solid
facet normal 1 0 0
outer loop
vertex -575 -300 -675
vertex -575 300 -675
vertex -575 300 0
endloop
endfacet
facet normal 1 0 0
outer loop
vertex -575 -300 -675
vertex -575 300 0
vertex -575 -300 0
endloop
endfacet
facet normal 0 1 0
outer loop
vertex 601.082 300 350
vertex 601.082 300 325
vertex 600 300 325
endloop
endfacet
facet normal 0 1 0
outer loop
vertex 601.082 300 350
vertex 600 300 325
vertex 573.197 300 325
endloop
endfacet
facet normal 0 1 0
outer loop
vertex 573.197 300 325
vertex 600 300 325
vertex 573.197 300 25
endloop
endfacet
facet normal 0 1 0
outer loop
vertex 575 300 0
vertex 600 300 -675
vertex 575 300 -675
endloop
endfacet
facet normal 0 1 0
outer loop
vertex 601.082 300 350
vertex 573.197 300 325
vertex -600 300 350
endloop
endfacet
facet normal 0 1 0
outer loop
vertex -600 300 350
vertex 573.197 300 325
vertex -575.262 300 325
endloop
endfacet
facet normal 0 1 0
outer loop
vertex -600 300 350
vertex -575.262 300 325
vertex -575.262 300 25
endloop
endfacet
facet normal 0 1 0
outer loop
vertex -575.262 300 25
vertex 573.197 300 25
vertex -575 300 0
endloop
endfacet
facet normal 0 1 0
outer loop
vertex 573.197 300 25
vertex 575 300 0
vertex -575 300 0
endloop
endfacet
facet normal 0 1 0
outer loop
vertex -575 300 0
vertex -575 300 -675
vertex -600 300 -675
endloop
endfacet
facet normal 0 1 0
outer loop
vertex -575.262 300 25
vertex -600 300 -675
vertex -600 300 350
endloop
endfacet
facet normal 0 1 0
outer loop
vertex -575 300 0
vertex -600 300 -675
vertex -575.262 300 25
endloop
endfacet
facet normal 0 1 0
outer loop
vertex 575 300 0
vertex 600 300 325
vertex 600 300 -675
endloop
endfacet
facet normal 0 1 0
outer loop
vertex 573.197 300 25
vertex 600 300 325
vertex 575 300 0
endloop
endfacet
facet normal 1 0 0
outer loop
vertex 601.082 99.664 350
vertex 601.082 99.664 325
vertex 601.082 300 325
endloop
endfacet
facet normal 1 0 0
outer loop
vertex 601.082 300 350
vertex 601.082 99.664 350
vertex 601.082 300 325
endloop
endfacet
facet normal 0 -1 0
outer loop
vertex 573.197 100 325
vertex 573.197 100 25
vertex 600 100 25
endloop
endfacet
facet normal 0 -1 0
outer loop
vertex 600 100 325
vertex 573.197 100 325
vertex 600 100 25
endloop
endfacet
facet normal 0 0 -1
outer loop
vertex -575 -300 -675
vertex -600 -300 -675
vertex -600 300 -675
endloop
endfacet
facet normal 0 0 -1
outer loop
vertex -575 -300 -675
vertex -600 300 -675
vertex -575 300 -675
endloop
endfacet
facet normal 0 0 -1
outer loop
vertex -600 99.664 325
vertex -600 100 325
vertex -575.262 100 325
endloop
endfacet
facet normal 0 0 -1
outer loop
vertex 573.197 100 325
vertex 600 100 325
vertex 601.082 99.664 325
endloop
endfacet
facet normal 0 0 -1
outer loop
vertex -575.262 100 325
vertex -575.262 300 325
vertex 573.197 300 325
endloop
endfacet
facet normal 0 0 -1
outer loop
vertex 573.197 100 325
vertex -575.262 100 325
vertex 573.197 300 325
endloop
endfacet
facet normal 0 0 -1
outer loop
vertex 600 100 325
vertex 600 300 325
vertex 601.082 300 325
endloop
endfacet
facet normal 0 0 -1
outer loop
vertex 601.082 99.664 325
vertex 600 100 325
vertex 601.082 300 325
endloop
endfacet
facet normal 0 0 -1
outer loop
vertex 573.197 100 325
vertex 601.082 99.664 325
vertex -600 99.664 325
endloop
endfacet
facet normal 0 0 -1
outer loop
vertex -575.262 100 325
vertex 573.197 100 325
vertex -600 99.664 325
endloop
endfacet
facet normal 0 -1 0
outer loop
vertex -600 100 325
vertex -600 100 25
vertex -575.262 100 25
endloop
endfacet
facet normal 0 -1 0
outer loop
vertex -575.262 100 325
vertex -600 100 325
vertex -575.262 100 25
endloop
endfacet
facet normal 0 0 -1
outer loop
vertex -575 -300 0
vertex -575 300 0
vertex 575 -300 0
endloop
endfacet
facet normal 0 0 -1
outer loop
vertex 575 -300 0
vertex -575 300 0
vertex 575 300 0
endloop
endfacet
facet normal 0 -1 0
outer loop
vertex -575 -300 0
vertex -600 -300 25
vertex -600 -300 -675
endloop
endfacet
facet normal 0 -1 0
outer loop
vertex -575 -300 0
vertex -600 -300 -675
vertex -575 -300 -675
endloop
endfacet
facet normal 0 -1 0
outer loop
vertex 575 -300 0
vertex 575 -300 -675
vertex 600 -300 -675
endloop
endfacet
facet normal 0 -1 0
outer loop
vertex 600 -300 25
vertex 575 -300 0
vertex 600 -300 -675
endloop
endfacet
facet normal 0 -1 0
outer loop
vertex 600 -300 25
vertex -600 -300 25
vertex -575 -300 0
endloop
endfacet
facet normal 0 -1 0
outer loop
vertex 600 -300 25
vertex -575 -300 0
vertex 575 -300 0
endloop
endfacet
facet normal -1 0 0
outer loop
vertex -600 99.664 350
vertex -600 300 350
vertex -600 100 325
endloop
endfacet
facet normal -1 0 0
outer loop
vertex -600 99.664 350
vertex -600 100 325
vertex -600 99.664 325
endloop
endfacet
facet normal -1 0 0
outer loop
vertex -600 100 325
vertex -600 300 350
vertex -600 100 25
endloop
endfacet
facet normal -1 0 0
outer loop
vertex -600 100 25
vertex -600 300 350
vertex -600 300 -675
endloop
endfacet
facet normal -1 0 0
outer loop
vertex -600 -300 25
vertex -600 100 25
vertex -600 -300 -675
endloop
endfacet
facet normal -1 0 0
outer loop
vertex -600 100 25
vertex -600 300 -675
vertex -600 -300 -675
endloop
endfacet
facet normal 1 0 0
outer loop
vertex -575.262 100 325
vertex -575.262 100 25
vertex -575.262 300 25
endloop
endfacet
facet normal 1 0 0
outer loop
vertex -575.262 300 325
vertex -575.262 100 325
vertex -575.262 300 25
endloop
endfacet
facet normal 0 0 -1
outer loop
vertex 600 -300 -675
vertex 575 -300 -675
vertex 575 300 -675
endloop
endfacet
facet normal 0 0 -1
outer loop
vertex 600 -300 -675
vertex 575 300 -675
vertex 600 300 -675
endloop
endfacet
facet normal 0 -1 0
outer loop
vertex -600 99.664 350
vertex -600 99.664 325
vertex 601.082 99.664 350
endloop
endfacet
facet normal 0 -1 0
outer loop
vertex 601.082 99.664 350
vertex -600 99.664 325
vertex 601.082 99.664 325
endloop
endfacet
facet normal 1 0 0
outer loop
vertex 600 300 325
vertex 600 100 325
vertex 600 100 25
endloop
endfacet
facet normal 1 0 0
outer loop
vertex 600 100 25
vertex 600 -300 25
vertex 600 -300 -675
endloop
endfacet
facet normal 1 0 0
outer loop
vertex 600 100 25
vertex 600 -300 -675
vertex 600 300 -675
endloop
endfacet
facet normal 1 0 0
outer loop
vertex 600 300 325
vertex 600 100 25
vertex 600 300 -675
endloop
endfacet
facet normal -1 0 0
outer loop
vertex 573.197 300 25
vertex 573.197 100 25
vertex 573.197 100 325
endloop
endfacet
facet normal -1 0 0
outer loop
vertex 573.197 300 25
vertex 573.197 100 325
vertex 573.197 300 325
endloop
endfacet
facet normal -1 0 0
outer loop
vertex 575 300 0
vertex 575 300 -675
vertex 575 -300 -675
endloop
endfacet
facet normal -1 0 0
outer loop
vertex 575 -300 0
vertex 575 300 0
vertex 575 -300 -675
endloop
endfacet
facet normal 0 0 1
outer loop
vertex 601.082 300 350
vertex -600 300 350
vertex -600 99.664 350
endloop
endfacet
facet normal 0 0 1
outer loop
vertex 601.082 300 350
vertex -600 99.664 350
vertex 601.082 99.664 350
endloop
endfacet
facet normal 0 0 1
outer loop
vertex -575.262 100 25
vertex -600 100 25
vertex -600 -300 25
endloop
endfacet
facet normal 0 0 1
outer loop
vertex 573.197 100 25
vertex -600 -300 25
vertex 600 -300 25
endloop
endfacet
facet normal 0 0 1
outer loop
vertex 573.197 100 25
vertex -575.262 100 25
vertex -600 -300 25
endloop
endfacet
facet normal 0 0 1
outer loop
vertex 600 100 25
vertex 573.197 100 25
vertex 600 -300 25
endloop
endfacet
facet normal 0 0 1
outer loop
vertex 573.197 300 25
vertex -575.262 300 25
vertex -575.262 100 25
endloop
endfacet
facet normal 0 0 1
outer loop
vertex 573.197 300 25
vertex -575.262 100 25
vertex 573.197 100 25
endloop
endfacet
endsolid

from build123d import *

# Parameters (mm, degrees)
F0_W     = 1200
F0_H     = 600
F1_DEPTH = 25
F2_W     = 25
F2_H     = 600
F3_DEPTH = 675
F4_W     = 24.7376918793
F4_H     = 200
F4_W_2   = 26.8032312393
F5_DEPTH = 300
F6_W     = 24.7376918793
F6_H     = 200
F7_DEPTH = 25


with BuildPart() as f1:
    # F0 (on Top) → F1 (new body)
    with BuildSketch(Plane.XY):
        Rectangle(F0_W, F0_H)
    extrude(amount=F1_DEPTH)

    # F2 (on face) → F3 (join)
    with BuildSketch(Plane(origin=(0, 0, 0), x_dir=(1, 0, 0), z_dir=(0, 0, -1))):
        with Locations((-587.5, 0)):
            Rectangle(F2_W, F2_H)
        with Locations((587.5, 0)):
            Rectangle(F2_W, F2_H)
    extrude(amount=F3_DEPTH)

    # F4 (on face) → F5 (join)
    with BuildSketch(Plane.XY.offset(25)):
        with Locations((-587.6311540604, 200)):
            Rectangle(F4_W, F4_H)
        with Locations((586.5983843803, 200)):
            Rectangle(F4_W_2, F4_H)
    extrude(amount=F5_DEPTH)

    # F6 (on face) → F7 (join)
    with BuildSketch(Plane.XY.offset(325)):
        with Locations((-587.6311540604, 200)):
            Rectangle(F6_W, F6_H)
        Polygon((601.0820269585, 300), (-575.2623081207, 300), (-575.2623081207, 100), (-600, 100), (-600, 99.6639356017), (601.0820269585, 99.6639356017), align=None)
    extrude(amount=F7_DEPTH)


solid = f1.part
